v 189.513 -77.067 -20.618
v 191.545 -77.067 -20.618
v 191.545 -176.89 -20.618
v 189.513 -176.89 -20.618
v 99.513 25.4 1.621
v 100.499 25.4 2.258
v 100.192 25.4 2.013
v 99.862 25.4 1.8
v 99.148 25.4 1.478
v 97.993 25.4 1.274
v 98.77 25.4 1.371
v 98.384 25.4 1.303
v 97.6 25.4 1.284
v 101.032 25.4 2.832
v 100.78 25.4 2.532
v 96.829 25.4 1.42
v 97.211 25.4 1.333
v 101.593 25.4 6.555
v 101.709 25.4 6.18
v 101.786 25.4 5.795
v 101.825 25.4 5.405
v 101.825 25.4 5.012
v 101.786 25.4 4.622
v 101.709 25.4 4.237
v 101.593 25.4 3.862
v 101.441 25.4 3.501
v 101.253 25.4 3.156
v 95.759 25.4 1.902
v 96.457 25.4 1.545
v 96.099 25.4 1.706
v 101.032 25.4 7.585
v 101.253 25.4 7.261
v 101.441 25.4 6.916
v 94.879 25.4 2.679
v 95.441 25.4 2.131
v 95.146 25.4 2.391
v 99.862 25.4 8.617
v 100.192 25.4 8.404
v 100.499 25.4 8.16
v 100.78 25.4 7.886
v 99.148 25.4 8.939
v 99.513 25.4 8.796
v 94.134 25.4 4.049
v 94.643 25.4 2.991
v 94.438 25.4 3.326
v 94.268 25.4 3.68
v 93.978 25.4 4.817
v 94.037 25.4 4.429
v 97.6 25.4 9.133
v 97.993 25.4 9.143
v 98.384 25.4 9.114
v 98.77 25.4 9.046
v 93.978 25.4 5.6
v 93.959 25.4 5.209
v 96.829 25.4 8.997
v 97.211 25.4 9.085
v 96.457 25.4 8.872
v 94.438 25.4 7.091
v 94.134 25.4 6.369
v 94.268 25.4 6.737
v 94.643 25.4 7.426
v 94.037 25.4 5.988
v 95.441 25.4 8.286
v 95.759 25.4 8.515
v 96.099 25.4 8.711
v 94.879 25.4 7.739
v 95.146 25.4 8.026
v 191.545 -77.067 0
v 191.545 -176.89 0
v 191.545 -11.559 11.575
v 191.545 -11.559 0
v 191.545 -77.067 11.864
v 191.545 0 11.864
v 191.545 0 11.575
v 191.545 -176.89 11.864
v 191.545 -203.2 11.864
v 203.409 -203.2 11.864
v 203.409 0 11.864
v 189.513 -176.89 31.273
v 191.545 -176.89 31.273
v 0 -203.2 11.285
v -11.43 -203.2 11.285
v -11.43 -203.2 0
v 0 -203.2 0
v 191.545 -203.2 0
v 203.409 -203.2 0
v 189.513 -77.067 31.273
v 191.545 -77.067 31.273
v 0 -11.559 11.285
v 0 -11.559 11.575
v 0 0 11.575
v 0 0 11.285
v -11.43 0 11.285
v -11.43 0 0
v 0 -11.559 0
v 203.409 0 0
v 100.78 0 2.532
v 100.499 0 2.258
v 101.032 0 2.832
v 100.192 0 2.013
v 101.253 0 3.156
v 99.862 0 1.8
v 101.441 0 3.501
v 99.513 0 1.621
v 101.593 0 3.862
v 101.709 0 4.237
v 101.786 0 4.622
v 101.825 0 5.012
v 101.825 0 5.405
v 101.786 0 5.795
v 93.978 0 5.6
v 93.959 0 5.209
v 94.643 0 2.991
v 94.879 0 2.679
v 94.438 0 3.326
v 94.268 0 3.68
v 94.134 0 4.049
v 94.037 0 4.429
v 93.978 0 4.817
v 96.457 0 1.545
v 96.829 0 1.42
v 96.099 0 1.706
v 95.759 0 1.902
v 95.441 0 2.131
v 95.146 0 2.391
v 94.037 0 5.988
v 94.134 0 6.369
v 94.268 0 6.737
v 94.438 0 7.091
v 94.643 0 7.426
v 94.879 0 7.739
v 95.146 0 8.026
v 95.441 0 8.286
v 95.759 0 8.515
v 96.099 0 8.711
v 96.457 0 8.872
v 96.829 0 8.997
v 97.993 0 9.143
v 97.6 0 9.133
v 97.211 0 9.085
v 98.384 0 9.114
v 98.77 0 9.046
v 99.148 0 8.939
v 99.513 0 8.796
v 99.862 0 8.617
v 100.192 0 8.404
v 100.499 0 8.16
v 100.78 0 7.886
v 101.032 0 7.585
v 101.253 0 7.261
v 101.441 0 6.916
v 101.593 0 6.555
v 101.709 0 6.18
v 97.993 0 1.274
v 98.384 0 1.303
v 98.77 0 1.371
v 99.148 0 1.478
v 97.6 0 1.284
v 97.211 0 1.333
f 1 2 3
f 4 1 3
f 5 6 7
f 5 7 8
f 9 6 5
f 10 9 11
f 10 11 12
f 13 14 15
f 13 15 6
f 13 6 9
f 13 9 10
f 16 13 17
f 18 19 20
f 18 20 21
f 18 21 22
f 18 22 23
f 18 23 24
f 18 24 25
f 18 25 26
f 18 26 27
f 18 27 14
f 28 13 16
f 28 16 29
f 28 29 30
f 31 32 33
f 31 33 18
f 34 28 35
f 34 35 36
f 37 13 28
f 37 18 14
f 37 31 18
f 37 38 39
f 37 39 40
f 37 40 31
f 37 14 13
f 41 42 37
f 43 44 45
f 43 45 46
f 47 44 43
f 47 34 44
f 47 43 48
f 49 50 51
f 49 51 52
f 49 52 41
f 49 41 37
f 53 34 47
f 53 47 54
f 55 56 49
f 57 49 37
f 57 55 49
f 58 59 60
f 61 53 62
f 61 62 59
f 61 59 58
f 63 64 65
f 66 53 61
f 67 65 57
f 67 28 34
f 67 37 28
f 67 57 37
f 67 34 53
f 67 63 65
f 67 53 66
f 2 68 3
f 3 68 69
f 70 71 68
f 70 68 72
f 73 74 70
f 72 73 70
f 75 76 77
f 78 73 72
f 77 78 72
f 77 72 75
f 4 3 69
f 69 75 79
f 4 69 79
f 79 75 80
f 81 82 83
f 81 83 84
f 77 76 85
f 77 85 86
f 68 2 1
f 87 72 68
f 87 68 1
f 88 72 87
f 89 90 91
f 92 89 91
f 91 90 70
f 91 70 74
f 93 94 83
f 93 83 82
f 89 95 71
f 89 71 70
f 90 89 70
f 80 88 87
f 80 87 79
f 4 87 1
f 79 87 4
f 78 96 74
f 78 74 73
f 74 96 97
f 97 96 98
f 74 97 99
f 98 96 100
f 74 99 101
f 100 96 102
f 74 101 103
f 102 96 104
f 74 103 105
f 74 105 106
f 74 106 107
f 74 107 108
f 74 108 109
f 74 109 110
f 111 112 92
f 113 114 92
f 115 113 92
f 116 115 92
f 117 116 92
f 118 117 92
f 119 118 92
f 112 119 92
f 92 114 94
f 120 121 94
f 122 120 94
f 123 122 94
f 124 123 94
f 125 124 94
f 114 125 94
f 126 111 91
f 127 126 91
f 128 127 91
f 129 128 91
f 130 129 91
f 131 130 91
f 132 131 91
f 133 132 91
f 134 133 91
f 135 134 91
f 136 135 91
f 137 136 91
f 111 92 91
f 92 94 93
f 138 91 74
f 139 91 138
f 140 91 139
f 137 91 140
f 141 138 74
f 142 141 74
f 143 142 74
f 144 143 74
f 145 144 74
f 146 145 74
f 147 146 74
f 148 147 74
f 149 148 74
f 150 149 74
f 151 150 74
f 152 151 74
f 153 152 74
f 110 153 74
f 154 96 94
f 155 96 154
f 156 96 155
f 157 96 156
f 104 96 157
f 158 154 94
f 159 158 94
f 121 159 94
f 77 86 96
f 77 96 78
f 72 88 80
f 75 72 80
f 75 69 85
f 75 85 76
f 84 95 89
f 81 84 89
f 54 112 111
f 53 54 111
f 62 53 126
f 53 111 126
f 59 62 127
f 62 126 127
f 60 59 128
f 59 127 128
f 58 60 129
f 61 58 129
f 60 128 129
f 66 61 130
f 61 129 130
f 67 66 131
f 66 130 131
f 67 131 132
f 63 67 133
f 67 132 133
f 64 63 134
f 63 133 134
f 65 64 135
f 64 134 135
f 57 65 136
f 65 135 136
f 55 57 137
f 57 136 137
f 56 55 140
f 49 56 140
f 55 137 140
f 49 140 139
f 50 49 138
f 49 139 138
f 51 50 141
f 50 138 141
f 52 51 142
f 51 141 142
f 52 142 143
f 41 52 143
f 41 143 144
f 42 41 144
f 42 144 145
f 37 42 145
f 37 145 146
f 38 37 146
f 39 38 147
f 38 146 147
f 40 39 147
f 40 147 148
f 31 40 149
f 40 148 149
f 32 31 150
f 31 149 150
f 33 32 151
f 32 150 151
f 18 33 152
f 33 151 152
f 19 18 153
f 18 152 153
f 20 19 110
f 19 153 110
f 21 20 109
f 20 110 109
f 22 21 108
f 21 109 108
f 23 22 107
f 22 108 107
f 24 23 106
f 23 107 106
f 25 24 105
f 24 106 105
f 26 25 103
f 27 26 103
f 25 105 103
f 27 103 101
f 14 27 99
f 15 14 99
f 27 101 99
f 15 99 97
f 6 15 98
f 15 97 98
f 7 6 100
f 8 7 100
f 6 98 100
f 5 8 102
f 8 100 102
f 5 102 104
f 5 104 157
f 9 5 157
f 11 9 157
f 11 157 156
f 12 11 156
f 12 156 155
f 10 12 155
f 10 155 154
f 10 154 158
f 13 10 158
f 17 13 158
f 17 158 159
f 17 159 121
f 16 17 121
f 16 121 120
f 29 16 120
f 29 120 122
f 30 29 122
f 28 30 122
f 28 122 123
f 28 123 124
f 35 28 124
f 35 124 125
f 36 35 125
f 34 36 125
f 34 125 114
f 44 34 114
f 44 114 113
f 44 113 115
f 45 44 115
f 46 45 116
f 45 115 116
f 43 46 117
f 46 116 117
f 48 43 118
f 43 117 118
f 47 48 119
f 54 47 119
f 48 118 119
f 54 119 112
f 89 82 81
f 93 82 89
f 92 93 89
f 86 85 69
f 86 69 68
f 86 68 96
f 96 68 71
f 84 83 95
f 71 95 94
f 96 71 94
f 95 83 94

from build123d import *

# Parameters (mm, degrees)
F0_W     = 11.43
F0_H     = 11.285316
F1_DEPTH = 203.2
F2_W     = 11.558608
F2_H     = 11.574684
F3_DEPTH = 203.2
F4_W     = 11.864051
F4_H     = 11.86405
F5_DEPTH = 203.2
F6_W     = 99.82273
F6_H     = 51.891416
F7_DEPTH = 2.032
F8_R     = 3.935821
F9_DEPTH = 25.4


with BuildPart() as f1:
    # F0 (on Front) → F1 (new body)
    with BuildSketch(Plane.XZ):
        with Locations((-5.715, 5.642658)):
            Rectangle(F0_W, F0_H)
    extrude(amount=F1_DEPTH)

    # F2 (on Right) → F3 (join)
    with BuildSketch(Plane.YZ):
        with Locations((-5.779304, 5.787342)):
            Rectangle(F2_W, F2_H)
    extrude(amount=F3_DEPTH)

    # F4 (on Front) → F5 (join)
    with BuildSketch(Plane.XZ):
        with Locations((197.47696, 5.932025)):
            Rectangle(F4_W, F4_H)
    extrude(amount=F5_DEPTH)

    # F6 (on face) → F7 (join)
    with BuildSketch(Plane(origin=(191.544935, 0, 0), x_dir=(0, -1, 0), z_dir=(-1, 0, 0))):
        with Locations((126.978308, 5.327698)):
            Rectangle(F6_W, F6_H)
    extrude(amount=F7_DEPTH)

    # F8 (on face) → F9 (join)
    with BuildSketch(Plane(origin=(0, 0, 0), x_dir=(-1, 0, 0), z_dir=(0, 1, 0))):
        with Locations((-97.89449, 5.208607)):
            Circle(F8_R)
    extrude(amount=F9_DEPTH)


solid = f1.part
